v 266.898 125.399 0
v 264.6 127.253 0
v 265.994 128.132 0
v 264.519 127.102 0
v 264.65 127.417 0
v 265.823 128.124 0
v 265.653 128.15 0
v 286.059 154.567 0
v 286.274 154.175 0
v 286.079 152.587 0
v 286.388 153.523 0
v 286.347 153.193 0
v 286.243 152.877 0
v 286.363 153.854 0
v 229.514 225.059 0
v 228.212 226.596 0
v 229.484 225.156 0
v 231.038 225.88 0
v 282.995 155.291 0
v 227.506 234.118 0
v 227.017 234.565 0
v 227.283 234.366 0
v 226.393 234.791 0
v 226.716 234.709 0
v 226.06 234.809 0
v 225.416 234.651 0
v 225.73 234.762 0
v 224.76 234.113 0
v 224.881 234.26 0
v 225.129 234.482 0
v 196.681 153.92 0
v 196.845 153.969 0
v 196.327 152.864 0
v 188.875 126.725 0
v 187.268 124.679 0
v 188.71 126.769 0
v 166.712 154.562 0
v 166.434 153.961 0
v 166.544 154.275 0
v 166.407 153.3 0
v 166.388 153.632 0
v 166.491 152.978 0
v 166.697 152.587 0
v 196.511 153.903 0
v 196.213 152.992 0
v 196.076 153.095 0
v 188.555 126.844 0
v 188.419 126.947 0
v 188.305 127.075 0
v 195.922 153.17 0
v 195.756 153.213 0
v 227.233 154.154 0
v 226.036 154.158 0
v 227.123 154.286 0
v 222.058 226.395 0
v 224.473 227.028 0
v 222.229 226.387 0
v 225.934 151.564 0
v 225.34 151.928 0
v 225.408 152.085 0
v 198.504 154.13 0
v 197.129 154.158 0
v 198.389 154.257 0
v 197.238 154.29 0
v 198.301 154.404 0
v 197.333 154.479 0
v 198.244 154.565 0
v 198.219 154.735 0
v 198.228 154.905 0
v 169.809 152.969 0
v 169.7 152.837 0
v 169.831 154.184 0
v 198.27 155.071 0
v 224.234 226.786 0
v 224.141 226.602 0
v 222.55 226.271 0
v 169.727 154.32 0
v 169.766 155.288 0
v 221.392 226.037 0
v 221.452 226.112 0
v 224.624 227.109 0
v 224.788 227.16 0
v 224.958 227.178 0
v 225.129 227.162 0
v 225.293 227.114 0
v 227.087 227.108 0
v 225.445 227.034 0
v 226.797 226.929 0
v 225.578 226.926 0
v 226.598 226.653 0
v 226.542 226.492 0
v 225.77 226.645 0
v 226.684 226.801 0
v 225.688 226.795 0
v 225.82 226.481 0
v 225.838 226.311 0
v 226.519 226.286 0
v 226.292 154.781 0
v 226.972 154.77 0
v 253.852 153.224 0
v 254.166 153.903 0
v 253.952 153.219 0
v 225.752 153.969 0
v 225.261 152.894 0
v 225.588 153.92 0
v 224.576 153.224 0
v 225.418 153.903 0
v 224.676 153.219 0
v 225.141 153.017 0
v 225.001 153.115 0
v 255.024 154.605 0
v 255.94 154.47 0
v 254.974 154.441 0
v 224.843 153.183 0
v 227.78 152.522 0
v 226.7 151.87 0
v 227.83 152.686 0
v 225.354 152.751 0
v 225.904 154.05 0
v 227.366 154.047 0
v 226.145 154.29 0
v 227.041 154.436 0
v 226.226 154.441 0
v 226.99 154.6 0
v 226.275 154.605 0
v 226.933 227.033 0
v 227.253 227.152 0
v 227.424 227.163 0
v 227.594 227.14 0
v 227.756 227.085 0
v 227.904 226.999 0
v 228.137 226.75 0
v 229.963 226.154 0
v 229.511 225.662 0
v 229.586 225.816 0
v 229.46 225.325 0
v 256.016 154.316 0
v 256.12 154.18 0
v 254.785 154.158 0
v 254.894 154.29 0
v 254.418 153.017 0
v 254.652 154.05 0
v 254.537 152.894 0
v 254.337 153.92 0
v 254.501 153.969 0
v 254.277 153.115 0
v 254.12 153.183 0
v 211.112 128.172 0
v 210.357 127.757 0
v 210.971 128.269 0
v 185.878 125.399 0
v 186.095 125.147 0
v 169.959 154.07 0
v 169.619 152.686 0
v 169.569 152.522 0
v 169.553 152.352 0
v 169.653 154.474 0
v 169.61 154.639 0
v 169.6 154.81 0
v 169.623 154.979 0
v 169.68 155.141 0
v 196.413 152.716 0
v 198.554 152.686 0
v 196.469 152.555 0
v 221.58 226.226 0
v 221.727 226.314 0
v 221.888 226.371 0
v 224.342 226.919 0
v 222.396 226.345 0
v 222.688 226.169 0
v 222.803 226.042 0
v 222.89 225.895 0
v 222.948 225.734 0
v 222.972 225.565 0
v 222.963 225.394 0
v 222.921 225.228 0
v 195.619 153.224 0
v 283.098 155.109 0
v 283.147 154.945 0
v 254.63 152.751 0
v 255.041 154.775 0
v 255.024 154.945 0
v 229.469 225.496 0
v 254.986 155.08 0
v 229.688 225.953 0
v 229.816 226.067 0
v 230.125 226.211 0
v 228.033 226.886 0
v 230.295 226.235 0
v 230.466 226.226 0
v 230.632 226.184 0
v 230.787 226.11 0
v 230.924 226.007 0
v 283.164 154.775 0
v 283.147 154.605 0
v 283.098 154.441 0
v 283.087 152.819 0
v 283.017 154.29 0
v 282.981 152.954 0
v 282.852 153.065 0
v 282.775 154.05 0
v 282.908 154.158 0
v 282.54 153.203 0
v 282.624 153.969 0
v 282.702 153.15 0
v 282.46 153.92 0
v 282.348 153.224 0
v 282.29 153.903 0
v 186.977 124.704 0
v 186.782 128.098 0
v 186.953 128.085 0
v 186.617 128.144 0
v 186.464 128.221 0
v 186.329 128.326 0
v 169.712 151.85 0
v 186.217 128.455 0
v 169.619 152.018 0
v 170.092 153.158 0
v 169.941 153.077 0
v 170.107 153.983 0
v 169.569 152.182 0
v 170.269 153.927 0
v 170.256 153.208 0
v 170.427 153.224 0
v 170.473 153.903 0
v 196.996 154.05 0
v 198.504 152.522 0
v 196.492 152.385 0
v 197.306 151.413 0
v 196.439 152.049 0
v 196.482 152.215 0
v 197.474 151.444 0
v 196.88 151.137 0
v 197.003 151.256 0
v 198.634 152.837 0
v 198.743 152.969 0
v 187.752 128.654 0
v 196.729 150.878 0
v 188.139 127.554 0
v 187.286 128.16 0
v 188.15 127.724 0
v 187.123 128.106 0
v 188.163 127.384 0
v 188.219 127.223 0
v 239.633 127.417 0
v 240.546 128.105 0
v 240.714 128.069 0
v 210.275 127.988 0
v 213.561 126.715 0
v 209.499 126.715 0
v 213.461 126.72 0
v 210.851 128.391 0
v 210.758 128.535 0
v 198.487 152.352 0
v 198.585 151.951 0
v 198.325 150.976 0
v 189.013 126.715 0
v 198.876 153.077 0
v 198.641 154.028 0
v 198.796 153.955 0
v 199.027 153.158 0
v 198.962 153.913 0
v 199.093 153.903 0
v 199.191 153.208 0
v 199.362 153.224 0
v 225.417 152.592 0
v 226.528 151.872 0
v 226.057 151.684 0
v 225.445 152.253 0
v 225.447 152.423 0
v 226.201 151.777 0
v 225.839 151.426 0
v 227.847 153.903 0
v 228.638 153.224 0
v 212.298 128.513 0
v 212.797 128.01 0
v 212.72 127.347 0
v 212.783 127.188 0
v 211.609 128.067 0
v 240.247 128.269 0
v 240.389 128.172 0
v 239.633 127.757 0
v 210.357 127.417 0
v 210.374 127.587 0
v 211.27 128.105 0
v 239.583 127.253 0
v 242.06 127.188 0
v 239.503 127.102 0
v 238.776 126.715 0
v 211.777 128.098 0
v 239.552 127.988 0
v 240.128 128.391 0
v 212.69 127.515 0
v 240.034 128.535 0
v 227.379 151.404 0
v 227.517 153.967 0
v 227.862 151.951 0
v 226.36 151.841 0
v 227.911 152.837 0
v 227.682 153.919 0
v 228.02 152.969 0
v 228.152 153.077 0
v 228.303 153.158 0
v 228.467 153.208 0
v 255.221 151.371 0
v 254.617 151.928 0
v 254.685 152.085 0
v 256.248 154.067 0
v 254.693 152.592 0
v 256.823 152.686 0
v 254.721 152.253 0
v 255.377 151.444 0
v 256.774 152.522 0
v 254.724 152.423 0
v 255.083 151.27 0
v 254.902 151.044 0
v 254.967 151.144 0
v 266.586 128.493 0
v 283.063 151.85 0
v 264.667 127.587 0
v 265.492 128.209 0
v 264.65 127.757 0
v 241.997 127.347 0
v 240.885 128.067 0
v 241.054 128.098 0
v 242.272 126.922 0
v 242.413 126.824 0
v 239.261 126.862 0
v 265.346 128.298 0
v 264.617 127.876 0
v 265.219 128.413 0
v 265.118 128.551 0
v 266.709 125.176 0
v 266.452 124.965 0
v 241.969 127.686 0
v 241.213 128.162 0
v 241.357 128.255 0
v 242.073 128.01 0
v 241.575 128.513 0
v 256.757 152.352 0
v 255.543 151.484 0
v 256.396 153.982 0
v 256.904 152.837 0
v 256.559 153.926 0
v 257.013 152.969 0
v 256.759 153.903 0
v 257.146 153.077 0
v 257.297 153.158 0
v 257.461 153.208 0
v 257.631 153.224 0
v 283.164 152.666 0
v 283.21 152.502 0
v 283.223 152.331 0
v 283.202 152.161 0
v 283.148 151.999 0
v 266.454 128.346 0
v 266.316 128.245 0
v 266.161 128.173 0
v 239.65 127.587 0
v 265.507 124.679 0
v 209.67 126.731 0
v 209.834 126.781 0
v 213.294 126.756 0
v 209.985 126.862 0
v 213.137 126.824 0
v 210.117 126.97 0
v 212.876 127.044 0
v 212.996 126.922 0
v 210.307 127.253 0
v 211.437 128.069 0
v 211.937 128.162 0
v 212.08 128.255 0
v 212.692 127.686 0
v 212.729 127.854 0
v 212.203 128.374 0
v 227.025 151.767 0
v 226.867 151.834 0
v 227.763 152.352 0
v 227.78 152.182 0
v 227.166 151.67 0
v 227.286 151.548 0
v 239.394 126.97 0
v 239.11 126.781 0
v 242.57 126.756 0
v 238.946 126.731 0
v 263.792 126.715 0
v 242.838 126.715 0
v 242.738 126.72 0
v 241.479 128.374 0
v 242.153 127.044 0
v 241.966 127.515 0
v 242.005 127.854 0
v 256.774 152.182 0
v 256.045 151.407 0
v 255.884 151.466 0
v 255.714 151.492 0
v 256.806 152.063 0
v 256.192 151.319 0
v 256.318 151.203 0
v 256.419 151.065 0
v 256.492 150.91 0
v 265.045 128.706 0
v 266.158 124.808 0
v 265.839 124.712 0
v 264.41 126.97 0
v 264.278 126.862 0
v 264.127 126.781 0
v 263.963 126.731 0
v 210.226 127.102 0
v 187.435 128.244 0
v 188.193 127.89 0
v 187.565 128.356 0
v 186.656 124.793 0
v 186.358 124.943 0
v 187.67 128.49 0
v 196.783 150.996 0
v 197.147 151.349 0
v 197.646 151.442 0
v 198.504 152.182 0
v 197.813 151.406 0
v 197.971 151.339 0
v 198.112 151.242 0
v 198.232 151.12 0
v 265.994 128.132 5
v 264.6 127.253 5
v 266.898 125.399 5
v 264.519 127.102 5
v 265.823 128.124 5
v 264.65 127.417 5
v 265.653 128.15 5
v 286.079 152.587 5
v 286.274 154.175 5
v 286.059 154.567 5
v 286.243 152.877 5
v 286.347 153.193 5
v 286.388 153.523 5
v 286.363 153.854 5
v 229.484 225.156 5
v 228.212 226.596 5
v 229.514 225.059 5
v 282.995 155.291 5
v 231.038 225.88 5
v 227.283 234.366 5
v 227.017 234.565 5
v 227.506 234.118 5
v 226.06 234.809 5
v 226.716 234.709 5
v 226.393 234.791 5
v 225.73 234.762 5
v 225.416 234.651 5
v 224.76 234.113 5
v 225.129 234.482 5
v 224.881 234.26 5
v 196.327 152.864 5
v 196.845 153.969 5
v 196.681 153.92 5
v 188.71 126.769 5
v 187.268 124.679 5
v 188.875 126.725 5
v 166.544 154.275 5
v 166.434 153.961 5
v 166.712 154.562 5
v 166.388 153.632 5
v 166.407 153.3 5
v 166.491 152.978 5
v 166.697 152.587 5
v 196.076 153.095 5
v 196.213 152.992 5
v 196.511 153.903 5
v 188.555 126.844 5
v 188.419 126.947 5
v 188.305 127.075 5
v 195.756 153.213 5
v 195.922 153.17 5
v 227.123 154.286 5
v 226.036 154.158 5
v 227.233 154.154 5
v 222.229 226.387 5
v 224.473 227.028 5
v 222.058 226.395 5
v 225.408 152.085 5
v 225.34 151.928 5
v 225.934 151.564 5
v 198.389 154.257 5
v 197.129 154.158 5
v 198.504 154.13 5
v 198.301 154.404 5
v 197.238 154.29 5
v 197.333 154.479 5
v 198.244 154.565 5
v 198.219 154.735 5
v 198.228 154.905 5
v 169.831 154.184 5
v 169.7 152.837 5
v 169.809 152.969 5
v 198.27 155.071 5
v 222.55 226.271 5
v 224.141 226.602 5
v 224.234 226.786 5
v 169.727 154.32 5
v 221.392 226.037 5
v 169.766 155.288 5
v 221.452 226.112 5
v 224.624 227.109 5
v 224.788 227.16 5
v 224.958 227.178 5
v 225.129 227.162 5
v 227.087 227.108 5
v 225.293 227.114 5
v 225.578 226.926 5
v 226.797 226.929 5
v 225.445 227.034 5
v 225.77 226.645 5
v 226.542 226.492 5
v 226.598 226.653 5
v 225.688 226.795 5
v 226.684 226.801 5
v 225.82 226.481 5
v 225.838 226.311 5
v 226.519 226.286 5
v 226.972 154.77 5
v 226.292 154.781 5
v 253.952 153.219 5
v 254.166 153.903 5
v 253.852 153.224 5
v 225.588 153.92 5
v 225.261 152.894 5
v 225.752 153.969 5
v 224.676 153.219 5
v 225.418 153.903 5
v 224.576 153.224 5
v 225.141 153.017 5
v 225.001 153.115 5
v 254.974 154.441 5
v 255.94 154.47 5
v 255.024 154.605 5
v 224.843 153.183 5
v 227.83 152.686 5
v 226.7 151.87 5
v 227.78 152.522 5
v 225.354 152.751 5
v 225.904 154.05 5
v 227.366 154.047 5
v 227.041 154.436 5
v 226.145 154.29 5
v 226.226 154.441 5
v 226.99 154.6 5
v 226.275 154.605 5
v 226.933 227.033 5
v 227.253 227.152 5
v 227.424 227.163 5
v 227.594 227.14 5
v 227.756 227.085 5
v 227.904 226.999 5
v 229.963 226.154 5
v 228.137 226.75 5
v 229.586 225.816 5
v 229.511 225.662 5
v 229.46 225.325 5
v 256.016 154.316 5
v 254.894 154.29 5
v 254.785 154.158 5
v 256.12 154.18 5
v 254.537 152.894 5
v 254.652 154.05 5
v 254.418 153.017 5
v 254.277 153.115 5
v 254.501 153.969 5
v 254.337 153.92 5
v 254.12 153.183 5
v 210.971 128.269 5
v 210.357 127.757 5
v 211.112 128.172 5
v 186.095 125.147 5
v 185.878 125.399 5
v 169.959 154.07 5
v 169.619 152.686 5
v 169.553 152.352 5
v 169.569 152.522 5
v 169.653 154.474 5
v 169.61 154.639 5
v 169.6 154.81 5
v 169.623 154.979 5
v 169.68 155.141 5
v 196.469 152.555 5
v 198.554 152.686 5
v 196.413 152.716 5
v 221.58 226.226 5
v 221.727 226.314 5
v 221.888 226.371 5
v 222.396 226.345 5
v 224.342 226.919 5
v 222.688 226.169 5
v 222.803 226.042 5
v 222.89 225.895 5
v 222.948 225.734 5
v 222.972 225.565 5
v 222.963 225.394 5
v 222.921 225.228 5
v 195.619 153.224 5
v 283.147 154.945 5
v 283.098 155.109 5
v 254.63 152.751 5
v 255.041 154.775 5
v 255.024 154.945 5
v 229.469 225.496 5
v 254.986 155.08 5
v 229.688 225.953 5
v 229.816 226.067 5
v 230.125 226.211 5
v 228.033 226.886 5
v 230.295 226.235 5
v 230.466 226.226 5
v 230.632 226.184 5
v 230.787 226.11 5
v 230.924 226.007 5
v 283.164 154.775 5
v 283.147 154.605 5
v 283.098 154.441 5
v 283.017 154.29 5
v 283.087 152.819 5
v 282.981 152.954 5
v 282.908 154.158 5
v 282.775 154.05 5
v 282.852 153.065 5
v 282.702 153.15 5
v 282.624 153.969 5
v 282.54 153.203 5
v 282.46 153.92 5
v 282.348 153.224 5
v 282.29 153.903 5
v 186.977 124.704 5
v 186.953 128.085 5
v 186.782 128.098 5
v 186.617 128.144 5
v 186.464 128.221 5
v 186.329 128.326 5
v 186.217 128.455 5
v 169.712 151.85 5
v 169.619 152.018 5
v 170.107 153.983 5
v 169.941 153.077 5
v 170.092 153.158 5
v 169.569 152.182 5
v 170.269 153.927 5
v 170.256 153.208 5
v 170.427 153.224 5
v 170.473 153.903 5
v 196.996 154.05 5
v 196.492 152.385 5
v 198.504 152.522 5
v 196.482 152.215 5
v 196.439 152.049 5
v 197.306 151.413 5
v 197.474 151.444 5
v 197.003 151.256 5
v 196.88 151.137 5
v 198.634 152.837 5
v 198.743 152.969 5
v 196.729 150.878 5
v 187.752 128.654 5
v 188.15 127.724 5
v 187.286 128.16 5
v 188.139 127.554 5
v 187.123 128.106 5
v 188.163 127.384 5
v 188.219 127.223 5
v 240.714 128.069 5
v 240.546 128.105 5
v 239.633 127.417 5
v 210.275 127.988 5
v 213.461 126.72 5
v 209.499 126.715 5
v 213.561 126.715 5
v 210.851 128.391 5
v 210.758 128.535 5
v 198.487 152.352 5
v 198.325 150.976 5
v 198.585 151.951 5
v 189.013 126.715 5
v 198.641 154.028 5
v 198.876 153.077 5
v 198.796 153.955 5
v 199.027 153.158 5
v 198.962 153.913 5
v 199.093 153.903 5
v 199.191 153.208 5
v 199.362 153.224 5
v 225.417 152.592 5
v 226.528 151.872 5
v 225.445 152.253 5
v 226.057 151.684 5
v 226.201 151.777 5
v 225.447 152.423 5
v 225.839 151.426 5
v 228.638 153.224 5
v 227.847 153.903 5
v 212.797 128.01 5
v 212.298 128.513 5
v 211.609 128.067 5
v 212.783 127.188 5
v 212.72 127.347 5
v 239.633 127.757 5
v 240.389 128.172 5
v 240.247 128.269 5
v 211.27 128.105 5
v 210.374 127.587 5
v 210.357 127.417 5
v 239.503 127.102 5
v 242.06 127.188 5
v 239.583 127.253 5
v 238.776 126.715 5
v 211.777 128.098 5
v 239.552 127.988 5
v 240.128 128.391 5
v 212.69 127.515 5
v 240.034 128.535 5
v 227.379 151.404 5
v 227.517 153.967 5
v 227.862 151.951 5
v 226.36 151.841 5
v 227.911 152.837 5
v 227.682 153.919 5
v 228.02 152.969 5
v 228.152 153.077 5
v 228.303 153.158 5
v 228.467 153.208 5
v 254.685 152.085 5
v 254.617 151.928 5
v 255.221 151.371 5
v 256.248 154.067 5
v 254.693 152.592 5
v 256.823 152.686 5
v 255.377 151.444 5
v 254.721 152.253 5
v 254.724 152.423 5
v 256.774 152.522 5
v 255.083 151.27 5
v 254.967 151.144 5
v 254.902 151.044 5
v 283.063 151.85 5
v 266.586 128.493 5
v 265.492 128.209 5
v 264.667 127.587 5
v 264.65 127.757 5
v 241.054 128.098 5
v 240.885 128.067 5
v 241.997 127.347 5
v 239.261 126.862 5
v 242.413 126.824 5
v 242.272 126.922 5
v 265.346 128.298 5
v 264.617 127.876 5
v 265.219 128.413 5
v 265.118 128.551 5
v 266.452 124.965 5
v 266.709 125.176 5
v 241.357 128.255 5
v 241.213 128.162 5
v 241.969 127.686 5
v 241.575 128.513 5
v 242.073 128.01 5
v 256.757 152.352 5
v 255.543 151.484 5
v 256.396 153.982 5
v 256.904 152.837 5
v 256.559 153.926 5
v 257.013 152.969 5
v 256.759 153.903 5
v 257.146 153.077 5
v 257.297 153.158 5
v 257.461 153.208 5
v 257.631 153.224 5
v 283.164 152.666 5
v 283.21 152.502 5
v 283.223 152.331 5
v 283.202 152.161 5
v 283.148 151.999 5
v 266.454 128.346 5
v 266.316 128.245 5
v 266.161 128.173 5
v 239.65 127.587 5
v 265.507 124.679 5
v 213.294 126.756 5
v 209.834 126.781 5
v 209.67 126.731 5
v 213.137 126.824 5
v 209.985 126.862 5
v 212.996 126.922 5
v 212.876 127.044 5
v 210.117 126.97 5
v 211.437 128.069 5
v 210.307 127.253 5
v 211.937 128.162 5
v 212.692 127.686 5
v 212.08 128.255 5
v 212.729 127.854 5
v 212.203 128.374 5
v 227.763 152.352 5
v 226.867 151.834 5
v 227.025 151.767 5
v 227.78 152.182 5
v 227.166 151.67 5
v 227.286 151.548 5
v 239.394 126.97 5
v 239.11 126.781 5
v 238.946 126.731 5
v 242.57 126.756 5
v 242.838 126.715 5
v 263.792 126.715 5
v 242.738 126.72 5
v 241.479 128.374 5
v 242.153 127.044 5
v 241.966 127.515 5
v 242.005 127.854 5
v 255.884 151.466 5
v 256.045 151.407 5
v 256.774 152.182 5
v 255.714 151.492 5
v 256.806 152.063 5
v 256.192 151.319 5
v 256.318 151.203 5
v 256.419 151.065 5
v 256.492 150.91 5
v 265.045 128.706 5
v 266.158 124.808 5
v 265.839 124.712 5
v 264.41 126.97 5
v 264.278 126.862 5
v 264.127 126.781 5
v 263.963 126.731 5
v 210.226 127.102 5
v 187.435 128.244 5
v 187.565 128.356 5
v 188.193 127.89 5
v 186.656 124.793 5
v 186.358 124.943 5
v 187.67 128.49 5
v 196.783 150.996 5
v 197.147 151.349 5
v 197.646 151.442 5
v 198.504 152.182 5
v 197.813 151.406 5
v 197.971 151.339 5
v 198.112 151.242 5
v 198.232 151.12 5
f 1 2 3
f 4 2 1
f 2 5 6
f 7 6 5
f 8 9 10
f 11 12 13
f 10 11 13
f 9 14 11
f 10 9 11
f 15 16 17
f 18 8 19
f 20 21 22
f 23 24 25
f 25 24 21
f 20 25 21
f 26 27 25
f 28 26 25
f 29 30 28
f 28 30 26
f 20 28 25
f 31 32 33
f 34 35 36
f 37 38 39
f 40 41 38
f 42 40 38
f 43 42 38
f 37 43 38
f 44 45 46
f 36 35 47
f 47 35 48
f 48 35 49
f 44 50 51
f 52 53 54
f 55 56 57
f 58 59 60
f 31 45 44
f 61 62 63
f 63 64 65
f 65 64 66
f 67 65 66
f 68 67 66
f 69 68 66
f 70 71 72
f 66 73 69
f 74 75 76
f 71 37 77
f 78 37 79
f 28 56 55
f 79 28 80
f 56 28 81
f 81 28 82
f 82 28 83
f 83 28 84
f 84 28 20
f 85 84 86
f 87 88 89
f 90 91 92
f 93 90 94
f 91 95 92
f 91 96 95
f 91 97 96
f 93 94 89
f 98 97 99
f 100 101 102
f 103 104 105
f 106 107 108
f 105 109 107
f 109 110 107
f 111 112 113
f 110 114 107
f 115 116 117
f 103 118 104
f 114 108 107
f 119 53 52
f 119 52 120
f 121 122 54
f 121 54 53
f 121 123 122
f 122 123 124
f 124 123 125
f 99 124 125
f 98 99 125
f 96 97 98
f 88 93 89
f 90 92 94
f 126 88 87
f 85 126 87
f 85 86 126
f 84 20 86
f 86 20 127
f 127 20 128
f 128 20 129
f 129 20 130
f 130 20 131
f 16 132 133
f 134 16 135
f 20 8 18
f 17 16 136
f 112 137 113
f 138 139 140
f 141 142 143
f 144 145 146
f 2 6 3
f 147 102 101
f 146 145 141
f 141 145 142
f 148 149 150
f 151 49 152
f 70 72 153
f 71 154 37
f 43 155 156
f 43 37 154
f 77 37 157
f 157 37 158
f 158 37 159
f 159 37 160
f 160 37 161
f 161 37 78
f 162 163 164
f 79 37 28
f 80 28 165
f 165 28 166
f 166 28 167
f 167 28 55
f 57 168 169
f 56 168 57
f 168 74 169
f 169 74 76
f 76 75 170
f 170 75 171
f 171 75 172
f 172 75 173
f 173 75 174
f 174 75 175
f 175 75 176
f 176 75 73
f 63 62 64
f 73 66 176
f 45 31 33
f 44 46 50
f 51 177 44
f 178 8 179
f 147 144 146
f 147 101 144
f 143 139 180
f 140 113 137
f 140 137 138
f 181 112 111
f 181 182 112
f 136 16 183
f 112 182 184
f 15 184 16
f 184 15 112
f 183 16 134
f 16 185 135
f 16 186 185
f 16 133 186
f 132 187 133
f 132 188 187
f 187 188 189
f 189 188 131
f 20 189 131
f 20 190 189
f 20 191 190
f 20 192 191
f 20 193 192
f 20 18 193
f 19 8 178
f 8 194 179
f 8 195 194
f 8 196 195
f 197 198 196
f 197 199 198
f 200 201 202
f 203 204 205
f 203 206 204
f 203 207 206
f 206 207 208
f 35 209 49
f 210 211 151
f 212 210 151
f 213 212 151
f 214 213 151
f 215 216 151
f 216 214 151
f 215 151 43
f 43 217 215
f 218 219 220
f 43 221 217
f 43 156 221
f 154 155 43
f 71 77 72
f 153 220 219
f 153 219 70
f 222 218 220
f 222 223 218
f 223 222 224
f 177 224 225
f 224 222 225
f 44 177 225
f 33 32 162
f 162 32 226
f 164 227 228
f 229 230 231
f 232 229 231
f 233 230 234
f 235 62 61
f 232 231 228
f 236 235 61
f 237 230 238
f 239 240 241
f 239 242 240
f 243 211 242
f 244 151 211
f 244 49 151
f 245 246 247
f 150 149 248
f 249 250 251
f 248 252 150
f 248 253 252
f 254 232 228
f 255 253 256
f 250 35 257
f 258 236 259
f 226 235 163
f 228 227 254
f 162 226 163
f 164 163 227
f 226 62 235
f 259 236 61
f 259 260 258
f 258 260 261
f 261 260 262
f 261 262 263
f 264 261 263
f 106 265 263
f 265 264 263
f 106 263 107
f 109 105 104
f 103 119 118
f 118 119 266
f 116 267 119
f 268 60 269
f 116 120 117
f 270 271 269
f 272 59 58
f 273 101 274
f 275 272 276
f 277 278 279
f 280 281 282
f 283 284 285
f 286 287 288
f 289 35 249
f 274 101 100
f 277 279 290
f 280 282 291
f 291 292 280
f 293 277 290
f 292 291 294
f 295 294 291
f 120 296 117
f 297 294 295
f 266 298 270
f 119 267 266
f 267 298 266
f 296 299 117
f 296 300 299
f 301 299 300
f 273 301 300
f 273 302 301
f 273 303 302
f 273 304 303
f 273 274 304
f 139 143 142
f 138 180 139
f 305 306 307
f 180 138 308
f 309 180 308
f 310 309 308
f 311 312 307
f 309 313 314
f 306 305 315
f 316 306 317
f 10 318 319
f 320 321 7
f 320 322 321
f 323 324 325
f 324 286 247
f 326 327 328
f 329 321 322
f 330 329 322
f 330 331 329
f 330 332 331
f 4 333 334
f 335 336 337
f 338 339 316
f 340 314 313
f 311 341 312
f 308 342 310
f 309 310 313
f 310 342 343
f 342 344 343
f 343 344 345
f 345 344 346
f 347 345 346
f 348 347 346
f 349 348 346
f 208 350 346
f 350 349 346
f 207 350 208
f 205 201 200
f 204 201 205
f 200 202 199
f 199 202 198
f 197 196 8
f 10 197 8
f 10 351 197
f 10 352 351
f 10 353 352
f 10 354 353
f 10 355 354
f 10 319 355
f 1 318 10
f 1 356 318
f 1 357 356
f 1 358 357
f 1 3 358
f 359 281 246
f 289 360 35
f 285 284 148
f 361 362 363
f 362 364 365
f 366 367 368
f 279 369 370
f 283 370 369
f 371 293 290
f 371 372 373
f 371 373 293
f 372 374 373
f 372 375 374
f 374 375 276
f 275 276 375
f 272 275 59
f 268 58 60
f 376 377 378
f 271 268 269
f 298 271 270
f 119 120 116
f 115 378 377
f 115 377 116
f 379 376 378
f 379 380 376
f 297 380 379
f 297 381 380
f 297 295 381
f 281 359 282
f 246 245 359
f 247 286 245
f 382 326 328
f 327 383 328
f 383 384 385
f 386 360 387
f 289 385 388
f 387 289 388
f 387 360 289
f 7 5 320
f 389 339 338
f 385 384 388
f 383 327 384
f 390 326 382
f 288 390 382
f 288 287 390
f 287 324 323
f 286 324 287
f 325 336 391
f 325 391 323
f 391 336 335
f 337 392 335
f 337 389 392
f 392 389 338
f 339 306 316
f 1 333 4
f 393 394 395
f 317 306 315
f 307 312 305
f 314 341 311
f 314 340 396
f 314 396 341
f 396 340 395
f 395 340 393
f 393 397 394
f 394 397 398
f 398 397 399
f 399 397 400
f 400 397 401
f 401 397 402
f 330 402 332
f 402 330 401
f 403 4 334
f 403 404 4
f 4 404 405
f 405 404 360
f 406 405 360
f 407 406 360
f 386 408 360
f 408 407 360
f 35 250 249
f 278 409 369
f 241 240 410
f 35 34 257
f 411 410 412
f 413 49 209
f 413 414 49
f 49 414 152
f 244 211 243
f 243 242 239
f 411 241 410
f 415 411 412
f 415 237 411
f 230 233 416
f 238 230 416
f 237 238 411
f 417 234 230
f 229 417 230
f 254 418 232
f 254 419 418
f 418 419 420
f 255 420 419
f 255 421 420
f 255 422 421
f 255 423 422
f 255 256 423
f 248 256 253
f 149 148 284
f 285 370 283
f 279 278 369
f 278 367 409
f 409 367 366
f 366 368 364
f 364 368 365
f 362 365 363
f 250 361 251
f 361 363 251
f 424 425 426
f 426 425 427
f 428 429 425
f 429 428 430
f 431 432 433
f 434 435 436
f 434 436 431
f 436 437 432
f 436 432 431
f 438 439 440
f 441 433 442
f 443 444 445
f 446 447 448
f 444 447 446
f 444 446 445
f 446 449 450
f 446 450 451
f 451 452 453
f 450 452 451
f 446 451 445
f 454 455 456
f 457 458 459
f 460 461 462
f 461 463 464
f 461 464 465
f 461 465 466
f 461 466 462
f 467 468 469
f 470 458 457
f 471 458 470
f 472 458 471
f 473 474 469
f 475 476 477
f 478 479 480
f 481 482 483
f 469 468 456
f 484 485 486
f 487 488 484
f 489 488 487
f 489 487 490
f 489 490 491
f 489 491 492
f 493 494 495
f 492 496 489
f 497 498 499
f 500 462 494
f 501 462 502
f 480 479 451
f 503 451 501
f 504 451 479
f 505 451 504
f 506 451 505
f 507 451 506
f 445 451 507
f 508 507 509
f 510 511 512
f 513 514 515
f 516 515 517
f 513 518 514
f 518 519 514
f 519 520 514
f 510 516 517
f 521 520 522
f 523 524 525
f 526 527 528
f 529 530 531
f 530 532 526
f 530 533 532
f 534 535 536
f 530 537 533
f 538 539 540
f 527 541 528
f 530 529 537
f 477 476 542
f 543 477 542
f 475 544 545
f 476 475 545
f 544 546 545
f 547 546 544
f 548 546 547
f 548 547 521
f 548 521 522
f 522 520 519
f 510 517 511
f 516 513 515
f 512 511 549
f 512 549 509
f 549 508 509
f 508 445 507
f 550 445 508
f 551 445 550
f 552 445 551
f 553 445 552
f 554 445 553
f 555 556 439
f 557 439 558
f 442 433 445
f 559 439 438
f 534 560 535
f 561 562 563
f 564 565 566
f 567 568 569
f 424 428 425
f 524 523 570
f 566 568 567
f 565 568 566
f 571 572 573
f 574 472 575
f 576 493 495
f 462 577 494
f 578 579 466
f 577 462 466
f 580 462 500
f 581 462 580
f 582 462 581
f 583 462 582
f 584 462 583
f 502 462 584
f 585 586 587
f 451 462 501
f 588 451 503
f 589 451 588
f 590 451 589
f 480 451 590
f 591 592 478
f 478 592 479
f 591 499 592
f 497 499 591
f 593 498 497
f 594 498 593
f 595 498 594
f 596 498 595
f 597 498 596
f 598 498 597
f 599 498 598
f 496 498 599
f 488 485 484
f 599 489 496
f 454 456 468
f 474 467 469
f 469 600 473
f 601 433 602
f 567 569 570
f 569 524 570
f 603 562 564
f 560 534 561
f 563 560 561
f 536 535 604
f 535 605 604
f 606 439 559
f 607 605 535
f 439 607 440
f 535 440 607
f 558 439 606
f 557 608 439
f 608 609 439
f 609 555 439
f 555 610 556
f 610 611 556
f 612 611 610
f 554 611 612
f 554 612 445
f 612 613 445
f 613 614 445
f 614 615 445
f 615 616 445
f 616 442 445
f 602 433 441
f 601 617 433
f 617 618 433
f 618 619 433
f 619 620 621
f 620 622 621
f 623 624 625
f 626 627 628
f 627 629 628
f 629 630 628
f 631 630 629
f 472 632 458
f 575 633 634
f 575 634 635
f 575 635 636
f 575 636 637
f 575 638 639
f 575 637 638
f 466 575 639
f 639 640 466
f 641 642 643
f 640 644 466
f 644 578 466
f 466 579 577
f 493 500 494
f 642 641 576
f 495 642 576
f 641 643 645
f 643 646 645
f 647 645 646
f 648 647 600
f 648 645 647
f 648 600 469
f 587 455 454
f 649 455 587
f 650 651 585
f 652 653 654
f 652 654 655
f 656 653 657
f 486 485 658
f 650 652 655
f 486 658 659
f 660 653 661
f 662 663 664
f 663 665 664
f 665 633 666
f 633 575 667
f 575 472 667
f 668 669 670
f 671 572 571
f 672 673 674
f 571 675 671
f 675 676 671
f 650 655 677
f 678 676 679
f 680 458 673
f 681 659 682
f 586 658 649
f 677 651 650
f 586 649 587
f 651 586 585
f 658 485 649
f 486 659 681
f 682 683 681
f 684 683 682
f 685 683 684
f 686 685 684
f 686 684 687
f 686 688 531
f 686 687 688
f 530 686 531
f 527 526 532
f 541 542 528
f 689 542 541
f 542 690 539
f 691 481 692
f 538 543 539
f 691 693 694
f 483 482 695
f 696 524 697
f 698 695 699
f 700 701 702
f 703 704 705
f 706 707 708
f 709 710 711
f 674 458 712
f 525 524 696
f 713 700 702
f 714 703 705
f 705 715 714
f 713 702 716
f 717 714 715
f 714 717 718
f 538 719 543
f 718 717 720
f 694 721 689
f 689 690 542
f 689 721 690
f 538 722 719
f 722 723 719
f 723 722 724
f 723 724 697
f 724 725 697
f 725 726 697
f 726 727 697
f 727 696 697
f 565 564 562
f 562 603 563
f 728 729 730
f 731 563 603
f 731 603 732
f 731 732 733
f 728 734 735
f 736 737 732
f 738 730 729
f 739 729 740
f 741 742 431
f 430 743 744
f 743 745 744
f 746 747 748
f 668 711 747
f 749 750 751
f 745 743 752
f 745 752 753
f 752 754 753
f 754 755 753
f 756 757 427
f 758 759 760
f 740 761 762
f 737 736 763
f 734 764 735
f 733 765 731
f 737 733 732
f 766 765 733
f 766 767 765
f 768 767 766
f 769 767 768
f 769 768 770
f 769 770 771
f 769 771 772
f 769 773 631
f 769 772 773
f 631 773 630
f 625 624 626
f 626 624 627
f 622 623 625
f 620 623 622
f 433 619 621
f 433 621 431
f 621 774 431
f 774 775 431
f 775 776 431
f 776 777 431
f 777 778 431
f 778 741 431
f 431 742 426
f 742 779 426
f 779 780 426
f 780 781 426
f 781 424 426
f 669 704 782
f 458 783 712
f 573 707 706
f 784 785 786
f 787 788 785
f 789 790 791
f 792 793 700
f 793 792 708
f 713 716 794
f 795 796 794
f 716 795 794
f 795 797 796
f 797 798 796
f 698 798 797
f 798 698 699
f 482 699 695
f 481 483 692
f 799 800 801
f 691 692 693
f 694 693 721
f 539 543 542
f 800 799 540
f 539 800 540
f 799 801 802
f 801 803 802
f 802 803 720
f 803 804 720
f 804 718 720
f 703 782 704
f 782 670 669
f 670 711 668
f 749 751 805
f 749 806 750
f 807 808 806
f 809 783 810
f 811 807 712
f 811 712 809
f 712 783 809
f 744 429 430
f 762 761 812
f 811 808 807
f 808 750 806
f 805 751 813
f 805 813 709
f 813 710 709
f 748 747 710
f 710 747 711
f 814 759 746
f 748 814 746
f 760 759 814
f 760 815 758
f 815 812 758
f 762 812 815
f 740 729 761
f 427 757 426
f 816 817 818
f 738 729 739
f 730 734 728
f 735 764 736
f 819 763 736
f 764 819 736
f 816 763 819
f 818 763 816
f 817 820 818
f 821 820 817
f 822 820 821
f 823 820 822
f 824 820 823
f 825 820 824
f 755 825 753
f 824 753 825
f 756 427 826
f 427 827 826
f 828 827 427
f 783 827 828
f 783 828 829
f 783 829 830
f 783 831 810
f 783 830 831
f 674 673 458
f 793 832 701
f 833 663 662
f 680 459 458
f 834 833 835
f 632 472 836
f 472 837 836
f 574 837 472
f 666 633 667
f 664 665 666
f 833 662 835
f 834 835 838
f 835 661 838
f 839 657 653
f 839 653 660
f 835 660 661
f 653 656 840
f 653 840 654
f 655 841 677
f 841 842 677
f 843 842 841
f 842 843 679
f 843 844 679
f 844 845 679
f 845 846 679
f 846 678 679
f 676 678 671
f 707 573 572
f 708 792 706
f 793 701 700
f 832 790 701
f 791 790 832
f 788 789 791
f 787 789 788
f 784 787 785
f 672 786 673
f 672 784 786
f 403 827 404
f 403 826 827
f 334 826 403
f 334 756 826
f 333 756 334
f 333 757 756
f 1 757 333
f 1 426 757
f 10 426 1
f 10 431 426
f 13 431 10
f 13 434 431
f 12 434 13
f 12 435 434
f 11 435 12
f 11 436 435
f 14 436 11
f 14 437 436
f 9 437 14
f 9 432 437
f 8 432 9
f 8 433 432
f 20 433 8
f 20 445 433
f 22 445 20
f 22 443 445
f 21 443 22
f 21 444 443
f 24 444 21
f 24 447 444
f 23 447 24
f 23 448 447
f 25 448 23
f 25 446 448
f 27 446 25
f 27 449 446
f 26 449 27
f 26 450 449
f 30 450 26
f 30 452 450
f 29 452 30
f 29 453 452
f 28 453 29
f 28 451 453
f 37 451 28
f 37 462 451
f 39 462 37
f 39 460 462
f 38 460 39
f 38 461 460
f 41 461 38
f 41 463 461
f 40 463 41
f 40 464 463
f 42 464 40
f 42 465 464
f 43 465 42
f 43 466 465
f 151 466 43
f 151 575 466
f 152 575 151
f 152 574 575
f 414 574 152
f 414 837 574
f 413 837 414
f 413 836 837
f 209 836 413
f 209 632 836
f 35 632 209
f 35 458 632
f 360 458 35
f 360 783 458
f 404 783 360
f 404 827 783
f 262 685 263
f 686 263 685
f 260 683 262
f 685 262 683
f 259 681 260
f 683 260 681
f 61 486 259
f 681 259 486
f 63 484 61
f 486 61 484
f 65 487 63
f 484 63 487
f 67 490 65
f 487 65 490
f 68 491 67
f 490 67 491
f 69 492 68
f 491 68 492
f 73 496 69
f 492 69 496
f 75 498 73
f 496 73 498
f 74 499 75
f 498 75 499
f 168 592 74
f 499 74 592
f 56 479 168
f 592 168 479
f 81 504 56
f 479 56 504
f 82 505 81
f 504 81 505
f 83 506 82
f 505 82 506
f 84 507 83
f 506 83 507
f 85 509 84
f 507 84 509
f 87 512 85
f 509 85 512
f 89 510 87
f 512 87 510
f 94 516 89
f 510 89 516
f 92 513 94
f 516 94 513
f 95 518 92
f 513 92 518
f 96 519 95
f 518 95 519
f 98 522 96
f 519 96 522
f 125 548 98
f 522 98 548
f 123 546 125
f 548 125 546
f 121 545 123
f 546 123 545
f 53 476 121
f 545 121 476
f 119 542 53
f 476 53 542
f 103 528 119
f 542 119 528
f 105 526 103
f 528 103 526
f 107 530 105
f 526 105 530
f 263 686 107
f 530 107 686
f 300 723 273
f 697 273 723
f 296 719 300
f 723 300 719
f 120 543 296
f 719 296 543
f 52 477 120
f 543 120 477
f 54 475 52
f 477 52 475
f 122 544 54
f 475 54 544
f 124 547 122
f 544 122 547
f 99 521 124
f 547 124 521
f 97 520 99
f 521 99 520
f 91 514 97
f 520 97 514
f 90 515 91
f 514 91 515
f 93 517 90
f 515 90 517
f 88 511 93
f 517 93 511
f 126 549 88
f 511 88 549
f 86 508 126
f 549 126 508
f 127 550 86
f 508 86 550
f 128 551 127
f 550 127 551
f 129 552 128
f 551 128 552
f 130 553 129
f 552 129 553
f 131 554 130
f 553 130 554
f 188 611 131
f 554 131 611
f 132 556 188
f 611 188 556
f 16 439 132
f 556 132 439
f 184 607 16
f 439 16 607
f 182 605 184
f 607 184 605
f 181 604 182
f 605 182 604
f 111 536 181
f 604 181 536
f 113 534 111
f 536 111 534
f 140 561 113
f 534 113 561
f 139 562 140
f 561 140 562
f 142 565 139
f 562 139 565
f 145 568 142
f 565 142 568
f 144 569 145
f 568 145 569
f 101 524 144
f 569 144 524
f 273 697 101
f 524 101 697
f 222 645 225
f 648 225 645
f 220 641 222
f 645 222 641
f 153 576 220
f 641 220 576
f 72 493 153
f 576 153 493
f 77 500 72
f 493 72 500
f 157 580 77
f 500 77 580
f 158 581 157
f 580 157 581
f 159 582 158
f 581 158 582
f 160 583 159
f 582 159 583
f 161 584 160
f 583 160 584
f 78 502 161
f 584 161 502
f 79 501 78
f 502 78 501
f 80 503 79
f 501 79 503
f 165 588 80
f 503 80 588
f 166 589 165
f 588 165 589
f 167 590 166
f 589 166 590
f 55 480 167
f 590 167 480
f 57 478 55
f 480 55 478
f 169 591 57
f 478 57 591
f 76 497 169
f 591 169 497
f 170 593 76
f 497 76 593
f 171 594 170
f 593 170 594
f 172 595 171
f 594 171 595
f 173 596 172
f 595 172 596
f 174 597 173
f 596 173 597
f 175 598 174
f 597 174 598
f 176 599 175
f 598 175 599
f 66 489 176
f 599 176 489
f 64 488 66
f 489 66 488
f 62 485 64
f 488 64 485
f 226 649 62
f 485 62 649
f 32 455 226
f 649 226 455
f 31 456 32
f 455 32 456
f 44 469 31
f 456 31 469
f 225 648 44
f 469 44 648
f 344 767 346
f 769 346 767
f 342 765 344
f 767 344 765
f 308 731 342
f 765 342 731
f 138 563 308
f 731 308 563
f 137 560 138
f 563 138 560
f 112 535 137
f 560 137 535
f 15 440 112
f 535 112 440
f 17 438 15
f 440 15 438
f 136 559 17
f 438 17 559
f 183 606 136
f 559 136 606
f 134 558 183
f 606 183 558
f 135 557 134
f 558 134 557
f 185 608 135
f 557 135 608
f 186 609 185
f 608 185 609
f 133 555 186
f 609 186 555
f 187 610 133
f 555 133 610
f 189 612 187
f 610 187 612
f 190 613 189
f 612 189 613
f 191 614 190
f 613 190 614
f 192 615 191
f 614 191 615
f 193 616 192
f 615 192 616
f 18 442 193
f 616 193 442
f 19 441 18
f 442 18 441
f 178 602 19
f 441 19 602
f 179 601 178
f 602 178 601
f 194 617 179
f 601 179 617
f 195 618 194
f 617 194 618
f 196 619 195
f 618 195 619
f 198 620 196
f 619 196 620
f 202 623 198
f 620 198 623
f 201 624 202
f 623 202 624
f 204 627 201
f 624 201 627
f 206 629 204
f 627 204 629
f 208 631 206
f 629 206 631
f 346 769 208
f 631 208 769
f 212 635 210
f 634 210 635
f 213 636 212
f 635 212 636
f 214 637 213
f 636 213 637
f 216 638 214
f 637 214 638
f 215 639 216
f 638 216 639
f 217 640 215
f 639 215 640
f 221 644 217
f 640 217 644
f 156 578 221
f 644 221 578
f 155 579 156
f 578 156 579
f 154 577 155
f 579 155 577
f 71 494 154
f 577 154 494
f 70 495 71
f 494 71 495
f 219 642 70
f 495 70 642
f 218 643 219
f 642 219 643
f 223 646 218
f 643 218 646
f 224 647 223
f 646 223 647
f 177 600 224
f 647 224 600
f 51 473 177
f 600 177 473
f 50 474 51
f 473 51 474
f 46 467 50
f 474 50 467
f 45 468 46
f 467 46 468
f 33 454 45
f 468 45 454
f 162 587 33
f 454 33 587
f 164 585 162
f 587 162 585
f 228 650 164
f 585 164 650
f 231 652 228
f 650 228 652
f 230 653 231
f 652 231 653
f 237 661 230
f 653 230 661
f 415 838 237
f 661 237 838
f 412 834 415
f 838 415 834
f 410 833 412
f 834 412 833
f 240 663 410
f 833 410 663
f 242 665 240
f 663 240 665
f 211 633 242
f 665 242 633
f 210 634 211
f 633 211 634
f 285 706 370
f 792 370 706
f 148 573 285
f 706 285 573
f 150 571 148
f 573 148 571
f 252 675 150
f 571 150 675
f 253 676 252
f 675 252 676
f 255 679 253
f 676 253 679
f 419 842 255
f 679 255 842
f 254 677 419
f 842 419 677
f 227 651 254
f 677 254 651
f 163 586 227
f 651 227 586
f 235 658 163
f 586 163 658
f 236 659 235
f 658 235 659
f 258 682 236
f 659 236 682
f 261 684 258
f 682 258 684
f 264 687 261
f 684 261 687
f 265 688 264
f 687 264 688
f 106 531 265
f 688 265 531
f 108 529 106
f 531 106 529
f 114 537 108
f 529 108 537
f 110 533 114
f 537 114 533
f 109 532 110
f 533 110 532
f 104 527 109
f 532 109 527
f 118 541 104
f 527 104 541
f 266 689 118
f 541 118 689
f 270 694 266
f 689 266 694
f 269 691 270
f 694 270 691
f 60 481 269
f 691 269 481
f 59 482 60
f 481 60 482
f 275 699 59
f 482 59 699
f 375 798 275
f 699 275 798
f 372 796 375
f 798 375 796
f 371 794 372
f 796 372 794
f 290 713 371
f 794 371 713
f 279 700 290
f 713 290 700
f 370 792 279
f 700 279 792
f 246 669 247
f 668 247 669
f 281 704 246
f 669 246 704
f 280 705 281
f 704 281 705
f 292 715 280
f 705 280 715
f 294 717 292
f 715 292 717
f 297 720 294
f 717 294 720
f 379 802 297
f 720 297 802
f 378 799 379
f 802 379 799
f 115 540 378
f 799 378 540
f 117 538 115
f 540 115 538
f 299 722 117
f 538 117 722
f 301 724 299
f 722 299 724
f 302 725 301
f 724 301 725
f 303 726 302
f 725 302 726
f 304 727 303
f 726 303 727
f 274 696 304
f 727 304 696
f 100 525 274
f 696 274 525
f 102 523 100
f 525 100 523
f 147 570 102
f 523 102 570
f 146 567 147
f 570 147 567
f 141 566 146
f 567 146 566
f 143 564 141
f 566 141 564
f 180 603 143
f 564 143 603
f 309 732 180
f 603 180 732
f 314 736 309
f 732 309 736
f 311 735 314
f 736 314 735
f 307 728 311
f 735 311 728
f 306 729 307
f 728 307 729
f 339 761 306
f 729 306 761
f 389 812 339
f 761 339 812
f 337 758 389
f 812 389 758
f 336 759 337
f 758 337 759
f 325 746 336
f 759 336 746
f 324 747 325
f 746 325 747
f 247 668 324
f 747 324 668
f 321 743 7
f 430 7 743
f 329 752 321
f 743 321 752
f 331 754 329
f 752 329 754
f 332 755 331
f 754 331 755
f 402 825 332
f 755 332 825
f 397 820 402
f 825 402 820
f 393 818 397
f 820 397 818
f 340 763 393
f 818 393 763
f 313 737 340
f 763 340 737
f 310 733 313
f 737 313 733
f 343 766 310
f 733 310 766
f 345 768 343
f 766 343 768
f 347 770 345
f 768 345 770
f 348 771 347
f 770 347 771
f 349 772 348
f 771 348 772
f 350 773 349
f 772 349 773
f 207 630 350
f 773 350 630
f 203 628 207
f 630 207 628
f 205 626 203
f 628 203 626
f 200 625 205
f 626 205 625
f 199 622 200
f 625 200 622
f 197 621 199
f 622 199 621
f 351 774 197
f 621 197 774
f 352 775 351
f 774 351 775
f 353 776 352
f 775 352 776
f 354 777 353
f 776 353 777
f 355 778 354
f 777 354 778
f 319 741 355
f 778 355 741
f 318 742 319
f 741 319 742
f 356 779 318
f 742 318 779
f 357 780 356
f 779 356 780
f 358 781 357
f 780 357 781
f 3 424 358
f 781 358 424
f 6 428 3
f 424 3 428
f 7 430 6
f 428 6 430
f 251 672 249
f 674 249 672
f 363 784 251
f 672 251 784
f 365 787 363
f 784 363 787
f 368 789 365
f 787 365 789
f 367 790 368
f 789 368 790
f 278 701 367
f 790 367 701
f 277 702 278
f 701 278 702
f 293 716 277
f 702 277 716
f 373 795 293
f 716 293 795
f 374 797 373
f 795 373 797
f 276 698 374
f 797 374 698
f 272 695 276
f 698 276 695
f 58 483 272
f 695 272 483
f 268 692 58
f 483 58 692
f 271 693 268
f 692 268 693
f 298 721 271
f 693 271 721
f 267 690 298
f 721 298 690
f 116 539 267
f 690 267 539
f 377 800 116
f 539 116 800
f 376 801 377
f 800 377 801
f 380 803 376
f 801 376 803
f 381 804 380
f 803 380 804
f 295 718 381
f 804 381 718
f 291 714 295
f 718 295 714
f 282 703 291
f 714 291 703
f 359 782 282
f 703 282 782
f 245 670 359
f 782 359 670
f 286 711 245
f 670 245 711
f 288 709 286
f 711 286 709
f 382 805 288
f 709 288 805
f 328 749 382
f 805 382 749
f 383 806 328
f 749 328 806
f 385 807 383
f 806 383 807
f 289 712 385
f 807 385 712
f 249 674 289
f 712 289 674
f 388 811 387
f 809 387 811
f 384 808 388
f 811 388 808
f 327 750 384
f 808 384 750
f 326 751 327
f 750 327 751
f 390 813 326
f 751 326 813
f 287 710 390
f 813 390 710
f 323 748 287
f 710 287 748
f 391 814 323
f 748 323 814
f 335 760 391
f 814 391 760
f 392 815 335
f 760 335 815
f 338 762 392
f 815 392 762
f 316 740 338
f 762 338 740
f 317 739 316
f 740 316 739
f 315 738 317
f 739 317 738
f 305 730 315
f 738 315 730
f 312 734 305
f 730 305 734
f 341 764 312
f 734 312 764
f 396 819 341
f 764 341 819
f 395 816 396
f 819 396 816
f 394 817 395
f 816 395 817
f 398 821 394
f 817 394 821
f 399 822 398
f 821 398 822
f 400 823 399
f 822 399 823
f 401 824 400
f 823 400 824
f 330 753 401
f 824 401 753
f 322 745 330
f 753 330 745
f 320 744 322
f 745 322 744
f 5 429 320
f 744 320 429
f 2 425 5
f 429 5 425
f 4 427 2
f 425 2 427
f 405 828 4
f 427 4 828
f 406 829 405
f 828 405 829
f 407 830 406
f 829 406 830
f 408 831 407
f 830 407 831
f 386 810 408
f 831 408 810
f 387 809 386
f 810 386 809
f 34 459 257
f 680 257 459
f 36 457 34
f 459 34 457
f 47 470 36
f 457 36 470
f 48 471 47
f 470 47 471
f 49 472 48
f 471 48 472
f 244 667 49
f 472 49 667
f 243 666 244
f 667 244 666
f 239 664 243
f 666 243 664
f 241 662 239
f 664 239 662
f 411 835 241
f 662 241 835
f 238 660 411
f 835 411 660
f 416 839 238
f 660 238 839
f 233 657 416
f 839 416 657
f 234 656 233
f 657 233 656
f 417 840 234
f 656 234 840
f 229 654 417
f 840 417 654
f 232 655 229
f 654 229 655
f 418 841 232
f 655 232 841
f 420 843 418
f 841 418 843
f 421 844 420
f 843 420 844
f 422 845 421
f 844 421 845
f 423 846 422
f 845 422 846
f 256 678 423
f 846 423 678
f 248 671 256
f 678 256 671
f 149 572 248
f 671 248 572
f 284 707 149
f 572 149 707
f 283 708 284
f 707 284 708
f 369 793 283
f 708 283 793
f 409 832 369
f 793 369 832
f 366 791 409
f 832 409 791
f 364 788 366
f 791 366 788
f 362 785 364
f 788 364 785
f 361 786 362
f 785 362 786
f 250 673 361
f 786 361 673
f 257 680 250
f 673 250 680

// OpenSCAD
/*
 * Customizable Origami - Diamond - https://www.thingiverse.com/thing:2637332
 * by Dennis Hofmann - https://www.thingiverse.com/mightynozzle/about
 * created 2017-11-10
 * version v1.0
 *
 * Changelog
 * --------------
 * v1.0:
 *      - final design
 * --------------
 * 
 * This work is licensed under the Creative Commons - Attribution - NonCommercial - ShareAlike license.
 * https://creativecommons.org/licenses/by-nc-sa/3.0/
 */


 // Parameter Section //
//-------------------//

// preview[view:north, tilt:top]

// The maximum size of the longest side. The shorter side will be automatically resized in same ratio.
max_size_in_millimeter = 120; //[20:300]

// The height of the model.
model_height_in_millimeter = 5; //[0.2:0.2:100]

// Thickness of the outer outline.
outline_size_in_millimeter = 2.1; //[0.5:0.1:20]

// Thickness of the inner outline.
inline_size_in_millimeter = 0.7; //[0.5:0.1:20]

// Roundiness of the ends of the inner outlines.
inline_edge_radius_in_millimeter = 0.9; //[0.0:0.1:5]

// Flip model
flip_model = "no"; //[yes,no]

/*[hidden]*/
max_size = max_size_in_millimeter;
model_height = model_height_in_millimeter;
$fn=32;

// Outer Points
A1 = [371, 251];
A2 = [419, 251];
A3 = [477, 251];
A4 = [526, 251];
A5 = [564, 305];
A6 = [448, 463];
A7 = [333, 305];

outline = [A1, A2, A3, A4, A5, A6, A7];

// Inner Points
B1 = [391, 305];
B2 = [449, 305];
B3 = [507, 305];

// Polygons
C1 = [A7, A1, B1];
C2 = [B1, A1, A2];
C3 = [A2, B2, B1];
C4 = [A2, A3, B2];
C5 = [A3, A4, B3];
C6 = [A3, B3, B2];
C7 = [A4, A5, B3];
C8 = [A5, A6, B3];
C9 = [B3, A6, B2];
C10 = [B2, B1, A6];
C11 = [B1, A7, A6];

cut_polygons = [C1, C2, C3, C4, C5, C6, C7, C8, C9, C10, C11];

min_x = A7[0];
min_y = A1[1];
max_x = A5[0];
max_y = A6[1];

x_size = max_x - min_x;
y_size = max_y - min_y;

x_factor = max_size / x_size;
y_factor = max_size / y_size;

inline_size = x_size > y_size ? inline_size_in_millimeter / x_factor / 2: inline_size_in_millimeter / y_factor / 2;
inline_edge_radius = x_size > y_size ? inline_edge_radius_in_millimeter / x_factor: inline_edge_radius_in_millimeter / y_factor;
outline_size = x_size > y_size ? outline_size_in_millimeter / x_factor - inline_size: outline_size_in_millimeter / y_factor - inline_size;


 // Program Section //
//-----------------//

if(x_size > y_size) {
    resize(newsize=[max_size, x_factor * y_size, model_height]){
        if(flip_model == "yes") {
            mirror([0,1,0]) {
                rotate([180,180,0]) {    
                    create(outline, cut_polygons);
                }
            }
        } else {
            create(outline, cut_polygons);
        }
    }
} else {
    resize(newsize=[y_factor * x_size, max_size, model_height]){
        if(flip_model == "yes") {
            mirror([0,1,0]) {
                rotate([180,180,0]) {    
                    create(outline, cut_polygons);
                }
            }
        } else {
            create(outline, cut_polygons);
        }
    }
}


 // Module Section //
//----------------//

module create() {
    linear_extrude(height=1) {
        difference() {
            offset(r = -0) {
                offset(r = +outline_size) {
                    polygon(points = outline, convexity = 10);
                }
            }
            
            for(cut_polygon = [0:len(cut_polygons)]) {
                offset(r = +inline_edge_radius) {
                    offset(r = -inline_size - inline_edge_radius) {
                        polygon(points = cut_polygons[cut_polygon], convexity = 10);
                    }
                }
            }
        }
    }
}
